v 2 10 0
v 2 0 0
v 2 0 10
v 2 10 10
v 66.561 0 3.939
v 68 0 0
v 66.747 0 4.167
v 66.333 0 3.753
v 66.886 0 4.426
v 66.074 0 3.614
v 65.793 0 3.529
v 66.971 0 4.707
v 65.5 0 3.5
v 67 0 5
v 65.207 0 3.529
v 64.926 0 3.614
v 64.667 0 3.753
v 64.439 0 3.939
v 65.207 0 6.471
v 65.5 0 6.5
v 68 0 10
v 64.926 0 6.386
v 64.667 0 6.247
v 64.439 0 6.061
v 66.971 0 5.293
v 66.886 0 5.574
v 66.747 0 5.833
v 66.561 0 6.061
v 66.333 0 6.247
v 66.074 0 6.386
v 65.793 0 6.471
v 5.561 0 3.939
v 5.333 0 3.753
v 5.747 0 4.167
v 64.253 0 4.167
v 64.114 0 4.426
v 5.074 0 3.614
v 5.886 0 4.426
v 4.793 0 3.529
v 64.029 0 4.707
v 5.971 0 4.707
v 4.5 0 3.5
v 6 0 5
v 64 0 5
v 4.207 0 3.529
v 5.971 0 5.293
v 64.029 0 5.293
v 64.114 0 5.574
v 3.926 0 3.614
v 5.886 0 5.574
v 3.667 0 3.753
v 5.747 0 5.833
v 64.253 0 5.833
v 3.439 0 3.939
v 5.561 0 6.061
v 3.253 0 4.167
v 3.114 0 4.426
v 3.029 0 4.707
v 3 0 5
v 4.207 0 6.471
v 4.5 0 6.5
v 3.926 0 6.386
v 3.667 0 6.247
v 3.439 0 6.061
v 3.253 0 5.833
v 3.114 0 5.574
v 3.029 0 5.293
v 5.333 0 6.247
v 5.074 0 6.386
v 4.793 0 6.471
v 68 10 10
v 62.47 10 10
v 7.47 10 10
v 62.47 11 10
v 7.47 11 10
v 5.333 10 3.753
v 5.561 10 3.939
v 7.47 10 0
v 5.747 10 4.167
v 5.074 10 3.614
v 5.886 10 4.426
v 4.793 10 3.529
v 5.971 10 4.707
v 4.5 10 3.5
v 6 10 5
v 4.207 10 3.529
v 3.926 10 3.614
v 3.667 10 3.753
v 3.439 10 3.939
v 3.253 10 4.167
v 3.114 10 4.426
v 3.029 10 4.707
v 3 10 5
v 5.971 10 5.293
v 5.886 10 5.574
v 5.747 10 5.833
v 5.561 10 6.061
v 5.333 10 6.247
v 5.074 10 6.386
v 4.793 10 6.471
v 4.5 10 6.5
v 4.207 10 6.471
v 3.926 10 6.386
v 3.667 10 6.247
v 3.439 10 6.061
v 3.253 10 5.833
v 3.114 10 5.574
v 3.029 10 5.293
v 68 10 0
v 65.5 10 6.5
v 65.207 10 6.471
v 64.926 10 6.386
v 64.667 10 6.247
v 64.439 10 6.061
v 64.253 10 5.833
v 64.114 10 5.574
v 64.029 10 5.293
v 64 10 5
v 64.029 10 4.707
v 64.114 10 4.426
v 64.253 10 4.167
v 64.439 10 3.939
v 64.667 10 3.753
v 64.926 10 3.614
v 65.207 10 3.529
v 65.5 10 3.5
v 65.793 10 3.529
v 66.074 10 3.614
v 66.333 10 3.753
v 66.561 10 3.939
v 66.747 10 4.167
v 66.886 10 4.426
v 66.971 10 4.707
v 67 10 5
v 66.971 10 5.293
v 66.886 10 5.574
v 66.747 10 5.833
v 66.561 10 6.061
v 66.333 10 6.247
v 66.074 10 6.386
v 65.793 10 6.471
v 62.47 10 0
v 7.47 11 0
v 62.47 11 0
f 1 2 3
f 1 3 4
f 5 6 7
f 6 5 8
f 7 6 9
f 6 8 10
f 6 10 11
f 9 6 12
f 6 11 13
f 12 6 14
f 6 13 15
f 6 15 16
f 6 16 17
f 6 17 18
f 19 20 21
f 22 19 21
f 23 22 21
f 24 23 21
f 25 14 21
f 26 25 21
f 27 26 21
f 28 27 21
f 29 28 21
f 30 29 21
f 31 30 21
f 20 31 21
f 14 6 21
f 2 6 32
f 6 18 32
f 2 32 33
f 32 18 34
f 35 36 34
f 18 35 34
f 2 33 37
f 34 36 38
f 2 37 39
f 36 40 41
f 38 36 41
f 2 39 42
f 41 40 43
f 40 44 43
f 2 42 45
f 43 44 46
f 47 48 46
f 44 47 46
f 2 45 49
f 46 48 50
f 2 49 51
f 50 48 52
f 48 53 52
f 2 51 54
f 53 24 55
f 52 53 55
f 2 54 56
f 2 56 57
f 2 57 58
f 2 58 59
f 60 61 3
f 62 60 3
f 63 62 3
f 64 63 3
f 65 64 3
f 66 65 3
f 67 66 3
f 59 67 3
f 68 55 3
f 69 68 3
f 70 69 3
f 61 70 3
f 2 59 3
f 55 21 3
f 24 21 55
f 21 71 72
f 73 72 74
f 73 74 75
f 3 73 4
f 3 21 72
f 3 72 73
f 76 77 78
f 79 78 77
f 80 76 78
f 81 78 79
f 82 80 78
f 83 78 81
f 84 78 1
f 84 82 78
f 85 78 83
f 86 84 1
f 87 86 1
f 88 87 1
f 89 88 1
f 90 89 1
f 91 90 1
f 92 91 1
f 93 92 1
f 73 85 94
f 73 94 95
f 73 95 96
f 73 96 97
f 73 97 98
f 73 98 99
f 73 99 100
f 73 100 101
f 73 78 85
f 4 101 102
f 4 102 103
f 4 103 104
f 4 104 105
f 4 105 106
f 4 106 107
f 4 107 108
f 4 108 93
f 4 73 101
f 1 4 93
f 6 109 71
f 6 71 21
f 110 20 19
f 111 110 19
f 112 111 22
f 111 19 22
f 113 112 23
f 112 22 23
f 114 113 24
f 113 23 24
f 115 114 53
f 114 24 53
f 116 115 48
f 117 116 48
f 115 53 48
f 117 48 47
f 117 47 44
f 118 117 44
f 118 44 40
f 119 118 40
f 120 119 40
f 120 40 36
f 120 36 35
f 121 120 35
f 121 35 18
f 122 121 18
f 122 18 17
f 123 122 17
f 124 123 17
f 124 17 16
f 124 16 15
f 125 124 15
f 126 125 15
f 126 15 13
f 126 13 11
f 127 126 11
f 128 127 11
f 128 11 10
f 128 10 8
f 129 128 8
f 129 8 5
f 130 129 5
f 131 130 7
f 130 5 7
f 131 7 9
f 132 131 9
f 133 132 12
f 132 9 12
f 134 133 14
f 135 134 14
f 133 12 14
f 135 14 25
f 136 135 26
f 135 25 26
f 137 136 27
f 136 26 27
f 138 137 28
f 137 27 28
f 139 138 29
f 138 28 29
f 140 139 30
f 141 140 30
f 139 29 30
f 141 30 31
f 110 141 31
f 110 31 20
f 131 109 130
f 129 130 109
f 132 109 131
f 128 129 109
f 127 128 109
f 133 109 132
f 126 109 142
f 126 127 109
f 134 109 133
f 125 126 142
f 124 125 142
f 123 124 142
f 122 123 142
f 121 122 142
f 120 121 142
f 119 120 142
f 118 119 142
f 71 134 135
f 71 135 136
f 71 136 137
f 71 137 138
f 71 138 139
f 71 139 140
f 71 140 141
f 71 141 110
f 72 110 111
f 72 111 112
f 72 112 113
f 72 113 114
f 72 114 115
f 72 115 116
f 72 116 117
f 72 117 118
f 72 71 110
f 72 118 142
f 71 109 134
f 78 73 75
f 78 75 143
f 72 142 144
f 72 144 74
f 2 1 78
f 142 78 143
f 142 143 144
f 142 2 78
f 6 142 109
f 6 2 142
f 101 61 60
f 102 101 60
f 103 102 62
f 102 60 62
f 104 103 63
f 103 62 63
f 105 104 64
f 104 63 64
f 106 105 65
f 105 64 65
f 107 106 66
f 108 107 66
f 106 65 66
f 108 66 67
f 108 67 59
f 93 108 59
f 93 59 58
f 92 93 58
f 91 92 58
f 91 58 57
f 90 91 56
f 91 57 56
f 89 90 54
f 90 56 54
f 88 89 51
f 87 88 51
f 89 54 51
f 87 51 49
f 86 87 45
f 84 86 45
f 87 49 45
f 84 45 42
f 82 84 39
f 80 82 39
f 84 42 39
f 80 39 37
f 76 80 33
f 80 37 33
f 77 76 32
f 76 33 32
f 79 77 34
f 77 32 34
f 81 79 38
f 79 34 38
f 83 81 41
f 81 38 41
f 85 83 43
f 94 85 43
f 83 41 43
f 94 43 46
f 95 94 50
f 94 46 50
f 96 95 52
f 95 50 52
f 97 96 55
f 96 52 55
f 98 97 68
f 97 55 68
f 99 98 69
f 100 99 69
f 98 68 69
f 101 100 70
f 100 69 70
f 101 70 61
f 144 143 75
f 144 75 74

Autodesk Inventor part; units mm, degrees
ref_plane "YZ Plane" through (0, 0, 0) normal (1, 0, 0) x (0, 1, 0)
ref_plane "XZ Plane" through (0, 0, 0) normal (0, 1, 0) x (-1, 0, 0)
ref_plane "XY Plane" through (0, 0, 0) normal (0, 0, 1) x (1, 0, 0)
sketch "スケッチ1" plane through (0, 0, 0) normal (0, 1, 0) x (-1, 0, 0)
  line L0 (0, 0) -> (-70, 0)
  line L1 (-70, 0) -> (-70, 10)
  line L2 (-70, 10) -> (0, 10)
  line L3 (0, 10) -> (0, 0)
  dimension "d0" = 70
  dimension "d1" = 10
extrude "押し出し1" add sketch "スケッチ1" along normal blind 10
sketch "スケッチ17" plane through (0, 10, 0) normal (0, 1, 0) x (1, 0, 0)
  line L0 (70, 0) -> (0, 0) projected
  line L1 (0, 0) -> (0, -10) projected
  line L2 (0, -10) -> (70, -10) projected
  line L3 (0, -5) -> (4.5, -5)
  line L4 (4.5, -5) -> (4.5, 0)
  line L5 (70, -5) -> (65.5, -5)
  point P0 (7.0002, -10)
  point P1 (7.0002, 0)
  dimension "d42" = 4.5
  dimension "d43" = 5
  dimension "d44" = 4.5
  dimension "d52" = 61
hole "穴1" at (4.5, 10, 5) at (65.5, 10, 5) direction (0, -1, 0) diameter 3 depth 10 tip angle 118
sketch "スケッチ18" plane through (70, 0, 0) normal (0, 0, -1) x (-1, 0, 0)
  line L0 (70, 0) -> (0, 0) projected
  line L1 (0, 10) -> (70, 10) projected
  line L2 (0, 10) -> (2, 10)
  line L3 (2, 10) -> (2, 0)
  line L4 (2, 0) -> (0, 0)
  line L5 (0, 0) -> (0, 10)
  line L6 (70, 0) -> (68, 0)
  line L7 (68, 0) -> (68, 10)
  line L8 (68, 10) -> (70, 10)
  line L9 (70, 10) -> (70, 0)
  point P0 (62.9998, 10)
  dimension "d53" = 2
  dimension "d54" = 2
extrude "押し出し15" cut sketch "スケッチ18" against normal blind 10 contours L0 L7 L1 L9 | L0 L5 L1 L3
sketch "スケッチ19" plane through (0, 10, 0) normal (0, 1, 0) x (1, 0, 0)
  line L0 (68, 0) -> (2, 0) projected
  line L1 (2, -10) -> (68, -10) projected
  line L2 (7.4699, 0) -> (62.4699, 0)
  line L3 (62.4699, 0) -> (62.4699, -10)
  line L4 (62.4699, -10) -> (7.4699, -10)
  line L5 (7.4699, -10) -> (7.4699, 0)
  point P0 (0, 0)
  dimension "d57" = 55
extrude "押し出し16" add sketch "スケッチ19" along normal blind 1
properties part number "知能ロボコンラックギア" material "鋼、炭素鋼"
